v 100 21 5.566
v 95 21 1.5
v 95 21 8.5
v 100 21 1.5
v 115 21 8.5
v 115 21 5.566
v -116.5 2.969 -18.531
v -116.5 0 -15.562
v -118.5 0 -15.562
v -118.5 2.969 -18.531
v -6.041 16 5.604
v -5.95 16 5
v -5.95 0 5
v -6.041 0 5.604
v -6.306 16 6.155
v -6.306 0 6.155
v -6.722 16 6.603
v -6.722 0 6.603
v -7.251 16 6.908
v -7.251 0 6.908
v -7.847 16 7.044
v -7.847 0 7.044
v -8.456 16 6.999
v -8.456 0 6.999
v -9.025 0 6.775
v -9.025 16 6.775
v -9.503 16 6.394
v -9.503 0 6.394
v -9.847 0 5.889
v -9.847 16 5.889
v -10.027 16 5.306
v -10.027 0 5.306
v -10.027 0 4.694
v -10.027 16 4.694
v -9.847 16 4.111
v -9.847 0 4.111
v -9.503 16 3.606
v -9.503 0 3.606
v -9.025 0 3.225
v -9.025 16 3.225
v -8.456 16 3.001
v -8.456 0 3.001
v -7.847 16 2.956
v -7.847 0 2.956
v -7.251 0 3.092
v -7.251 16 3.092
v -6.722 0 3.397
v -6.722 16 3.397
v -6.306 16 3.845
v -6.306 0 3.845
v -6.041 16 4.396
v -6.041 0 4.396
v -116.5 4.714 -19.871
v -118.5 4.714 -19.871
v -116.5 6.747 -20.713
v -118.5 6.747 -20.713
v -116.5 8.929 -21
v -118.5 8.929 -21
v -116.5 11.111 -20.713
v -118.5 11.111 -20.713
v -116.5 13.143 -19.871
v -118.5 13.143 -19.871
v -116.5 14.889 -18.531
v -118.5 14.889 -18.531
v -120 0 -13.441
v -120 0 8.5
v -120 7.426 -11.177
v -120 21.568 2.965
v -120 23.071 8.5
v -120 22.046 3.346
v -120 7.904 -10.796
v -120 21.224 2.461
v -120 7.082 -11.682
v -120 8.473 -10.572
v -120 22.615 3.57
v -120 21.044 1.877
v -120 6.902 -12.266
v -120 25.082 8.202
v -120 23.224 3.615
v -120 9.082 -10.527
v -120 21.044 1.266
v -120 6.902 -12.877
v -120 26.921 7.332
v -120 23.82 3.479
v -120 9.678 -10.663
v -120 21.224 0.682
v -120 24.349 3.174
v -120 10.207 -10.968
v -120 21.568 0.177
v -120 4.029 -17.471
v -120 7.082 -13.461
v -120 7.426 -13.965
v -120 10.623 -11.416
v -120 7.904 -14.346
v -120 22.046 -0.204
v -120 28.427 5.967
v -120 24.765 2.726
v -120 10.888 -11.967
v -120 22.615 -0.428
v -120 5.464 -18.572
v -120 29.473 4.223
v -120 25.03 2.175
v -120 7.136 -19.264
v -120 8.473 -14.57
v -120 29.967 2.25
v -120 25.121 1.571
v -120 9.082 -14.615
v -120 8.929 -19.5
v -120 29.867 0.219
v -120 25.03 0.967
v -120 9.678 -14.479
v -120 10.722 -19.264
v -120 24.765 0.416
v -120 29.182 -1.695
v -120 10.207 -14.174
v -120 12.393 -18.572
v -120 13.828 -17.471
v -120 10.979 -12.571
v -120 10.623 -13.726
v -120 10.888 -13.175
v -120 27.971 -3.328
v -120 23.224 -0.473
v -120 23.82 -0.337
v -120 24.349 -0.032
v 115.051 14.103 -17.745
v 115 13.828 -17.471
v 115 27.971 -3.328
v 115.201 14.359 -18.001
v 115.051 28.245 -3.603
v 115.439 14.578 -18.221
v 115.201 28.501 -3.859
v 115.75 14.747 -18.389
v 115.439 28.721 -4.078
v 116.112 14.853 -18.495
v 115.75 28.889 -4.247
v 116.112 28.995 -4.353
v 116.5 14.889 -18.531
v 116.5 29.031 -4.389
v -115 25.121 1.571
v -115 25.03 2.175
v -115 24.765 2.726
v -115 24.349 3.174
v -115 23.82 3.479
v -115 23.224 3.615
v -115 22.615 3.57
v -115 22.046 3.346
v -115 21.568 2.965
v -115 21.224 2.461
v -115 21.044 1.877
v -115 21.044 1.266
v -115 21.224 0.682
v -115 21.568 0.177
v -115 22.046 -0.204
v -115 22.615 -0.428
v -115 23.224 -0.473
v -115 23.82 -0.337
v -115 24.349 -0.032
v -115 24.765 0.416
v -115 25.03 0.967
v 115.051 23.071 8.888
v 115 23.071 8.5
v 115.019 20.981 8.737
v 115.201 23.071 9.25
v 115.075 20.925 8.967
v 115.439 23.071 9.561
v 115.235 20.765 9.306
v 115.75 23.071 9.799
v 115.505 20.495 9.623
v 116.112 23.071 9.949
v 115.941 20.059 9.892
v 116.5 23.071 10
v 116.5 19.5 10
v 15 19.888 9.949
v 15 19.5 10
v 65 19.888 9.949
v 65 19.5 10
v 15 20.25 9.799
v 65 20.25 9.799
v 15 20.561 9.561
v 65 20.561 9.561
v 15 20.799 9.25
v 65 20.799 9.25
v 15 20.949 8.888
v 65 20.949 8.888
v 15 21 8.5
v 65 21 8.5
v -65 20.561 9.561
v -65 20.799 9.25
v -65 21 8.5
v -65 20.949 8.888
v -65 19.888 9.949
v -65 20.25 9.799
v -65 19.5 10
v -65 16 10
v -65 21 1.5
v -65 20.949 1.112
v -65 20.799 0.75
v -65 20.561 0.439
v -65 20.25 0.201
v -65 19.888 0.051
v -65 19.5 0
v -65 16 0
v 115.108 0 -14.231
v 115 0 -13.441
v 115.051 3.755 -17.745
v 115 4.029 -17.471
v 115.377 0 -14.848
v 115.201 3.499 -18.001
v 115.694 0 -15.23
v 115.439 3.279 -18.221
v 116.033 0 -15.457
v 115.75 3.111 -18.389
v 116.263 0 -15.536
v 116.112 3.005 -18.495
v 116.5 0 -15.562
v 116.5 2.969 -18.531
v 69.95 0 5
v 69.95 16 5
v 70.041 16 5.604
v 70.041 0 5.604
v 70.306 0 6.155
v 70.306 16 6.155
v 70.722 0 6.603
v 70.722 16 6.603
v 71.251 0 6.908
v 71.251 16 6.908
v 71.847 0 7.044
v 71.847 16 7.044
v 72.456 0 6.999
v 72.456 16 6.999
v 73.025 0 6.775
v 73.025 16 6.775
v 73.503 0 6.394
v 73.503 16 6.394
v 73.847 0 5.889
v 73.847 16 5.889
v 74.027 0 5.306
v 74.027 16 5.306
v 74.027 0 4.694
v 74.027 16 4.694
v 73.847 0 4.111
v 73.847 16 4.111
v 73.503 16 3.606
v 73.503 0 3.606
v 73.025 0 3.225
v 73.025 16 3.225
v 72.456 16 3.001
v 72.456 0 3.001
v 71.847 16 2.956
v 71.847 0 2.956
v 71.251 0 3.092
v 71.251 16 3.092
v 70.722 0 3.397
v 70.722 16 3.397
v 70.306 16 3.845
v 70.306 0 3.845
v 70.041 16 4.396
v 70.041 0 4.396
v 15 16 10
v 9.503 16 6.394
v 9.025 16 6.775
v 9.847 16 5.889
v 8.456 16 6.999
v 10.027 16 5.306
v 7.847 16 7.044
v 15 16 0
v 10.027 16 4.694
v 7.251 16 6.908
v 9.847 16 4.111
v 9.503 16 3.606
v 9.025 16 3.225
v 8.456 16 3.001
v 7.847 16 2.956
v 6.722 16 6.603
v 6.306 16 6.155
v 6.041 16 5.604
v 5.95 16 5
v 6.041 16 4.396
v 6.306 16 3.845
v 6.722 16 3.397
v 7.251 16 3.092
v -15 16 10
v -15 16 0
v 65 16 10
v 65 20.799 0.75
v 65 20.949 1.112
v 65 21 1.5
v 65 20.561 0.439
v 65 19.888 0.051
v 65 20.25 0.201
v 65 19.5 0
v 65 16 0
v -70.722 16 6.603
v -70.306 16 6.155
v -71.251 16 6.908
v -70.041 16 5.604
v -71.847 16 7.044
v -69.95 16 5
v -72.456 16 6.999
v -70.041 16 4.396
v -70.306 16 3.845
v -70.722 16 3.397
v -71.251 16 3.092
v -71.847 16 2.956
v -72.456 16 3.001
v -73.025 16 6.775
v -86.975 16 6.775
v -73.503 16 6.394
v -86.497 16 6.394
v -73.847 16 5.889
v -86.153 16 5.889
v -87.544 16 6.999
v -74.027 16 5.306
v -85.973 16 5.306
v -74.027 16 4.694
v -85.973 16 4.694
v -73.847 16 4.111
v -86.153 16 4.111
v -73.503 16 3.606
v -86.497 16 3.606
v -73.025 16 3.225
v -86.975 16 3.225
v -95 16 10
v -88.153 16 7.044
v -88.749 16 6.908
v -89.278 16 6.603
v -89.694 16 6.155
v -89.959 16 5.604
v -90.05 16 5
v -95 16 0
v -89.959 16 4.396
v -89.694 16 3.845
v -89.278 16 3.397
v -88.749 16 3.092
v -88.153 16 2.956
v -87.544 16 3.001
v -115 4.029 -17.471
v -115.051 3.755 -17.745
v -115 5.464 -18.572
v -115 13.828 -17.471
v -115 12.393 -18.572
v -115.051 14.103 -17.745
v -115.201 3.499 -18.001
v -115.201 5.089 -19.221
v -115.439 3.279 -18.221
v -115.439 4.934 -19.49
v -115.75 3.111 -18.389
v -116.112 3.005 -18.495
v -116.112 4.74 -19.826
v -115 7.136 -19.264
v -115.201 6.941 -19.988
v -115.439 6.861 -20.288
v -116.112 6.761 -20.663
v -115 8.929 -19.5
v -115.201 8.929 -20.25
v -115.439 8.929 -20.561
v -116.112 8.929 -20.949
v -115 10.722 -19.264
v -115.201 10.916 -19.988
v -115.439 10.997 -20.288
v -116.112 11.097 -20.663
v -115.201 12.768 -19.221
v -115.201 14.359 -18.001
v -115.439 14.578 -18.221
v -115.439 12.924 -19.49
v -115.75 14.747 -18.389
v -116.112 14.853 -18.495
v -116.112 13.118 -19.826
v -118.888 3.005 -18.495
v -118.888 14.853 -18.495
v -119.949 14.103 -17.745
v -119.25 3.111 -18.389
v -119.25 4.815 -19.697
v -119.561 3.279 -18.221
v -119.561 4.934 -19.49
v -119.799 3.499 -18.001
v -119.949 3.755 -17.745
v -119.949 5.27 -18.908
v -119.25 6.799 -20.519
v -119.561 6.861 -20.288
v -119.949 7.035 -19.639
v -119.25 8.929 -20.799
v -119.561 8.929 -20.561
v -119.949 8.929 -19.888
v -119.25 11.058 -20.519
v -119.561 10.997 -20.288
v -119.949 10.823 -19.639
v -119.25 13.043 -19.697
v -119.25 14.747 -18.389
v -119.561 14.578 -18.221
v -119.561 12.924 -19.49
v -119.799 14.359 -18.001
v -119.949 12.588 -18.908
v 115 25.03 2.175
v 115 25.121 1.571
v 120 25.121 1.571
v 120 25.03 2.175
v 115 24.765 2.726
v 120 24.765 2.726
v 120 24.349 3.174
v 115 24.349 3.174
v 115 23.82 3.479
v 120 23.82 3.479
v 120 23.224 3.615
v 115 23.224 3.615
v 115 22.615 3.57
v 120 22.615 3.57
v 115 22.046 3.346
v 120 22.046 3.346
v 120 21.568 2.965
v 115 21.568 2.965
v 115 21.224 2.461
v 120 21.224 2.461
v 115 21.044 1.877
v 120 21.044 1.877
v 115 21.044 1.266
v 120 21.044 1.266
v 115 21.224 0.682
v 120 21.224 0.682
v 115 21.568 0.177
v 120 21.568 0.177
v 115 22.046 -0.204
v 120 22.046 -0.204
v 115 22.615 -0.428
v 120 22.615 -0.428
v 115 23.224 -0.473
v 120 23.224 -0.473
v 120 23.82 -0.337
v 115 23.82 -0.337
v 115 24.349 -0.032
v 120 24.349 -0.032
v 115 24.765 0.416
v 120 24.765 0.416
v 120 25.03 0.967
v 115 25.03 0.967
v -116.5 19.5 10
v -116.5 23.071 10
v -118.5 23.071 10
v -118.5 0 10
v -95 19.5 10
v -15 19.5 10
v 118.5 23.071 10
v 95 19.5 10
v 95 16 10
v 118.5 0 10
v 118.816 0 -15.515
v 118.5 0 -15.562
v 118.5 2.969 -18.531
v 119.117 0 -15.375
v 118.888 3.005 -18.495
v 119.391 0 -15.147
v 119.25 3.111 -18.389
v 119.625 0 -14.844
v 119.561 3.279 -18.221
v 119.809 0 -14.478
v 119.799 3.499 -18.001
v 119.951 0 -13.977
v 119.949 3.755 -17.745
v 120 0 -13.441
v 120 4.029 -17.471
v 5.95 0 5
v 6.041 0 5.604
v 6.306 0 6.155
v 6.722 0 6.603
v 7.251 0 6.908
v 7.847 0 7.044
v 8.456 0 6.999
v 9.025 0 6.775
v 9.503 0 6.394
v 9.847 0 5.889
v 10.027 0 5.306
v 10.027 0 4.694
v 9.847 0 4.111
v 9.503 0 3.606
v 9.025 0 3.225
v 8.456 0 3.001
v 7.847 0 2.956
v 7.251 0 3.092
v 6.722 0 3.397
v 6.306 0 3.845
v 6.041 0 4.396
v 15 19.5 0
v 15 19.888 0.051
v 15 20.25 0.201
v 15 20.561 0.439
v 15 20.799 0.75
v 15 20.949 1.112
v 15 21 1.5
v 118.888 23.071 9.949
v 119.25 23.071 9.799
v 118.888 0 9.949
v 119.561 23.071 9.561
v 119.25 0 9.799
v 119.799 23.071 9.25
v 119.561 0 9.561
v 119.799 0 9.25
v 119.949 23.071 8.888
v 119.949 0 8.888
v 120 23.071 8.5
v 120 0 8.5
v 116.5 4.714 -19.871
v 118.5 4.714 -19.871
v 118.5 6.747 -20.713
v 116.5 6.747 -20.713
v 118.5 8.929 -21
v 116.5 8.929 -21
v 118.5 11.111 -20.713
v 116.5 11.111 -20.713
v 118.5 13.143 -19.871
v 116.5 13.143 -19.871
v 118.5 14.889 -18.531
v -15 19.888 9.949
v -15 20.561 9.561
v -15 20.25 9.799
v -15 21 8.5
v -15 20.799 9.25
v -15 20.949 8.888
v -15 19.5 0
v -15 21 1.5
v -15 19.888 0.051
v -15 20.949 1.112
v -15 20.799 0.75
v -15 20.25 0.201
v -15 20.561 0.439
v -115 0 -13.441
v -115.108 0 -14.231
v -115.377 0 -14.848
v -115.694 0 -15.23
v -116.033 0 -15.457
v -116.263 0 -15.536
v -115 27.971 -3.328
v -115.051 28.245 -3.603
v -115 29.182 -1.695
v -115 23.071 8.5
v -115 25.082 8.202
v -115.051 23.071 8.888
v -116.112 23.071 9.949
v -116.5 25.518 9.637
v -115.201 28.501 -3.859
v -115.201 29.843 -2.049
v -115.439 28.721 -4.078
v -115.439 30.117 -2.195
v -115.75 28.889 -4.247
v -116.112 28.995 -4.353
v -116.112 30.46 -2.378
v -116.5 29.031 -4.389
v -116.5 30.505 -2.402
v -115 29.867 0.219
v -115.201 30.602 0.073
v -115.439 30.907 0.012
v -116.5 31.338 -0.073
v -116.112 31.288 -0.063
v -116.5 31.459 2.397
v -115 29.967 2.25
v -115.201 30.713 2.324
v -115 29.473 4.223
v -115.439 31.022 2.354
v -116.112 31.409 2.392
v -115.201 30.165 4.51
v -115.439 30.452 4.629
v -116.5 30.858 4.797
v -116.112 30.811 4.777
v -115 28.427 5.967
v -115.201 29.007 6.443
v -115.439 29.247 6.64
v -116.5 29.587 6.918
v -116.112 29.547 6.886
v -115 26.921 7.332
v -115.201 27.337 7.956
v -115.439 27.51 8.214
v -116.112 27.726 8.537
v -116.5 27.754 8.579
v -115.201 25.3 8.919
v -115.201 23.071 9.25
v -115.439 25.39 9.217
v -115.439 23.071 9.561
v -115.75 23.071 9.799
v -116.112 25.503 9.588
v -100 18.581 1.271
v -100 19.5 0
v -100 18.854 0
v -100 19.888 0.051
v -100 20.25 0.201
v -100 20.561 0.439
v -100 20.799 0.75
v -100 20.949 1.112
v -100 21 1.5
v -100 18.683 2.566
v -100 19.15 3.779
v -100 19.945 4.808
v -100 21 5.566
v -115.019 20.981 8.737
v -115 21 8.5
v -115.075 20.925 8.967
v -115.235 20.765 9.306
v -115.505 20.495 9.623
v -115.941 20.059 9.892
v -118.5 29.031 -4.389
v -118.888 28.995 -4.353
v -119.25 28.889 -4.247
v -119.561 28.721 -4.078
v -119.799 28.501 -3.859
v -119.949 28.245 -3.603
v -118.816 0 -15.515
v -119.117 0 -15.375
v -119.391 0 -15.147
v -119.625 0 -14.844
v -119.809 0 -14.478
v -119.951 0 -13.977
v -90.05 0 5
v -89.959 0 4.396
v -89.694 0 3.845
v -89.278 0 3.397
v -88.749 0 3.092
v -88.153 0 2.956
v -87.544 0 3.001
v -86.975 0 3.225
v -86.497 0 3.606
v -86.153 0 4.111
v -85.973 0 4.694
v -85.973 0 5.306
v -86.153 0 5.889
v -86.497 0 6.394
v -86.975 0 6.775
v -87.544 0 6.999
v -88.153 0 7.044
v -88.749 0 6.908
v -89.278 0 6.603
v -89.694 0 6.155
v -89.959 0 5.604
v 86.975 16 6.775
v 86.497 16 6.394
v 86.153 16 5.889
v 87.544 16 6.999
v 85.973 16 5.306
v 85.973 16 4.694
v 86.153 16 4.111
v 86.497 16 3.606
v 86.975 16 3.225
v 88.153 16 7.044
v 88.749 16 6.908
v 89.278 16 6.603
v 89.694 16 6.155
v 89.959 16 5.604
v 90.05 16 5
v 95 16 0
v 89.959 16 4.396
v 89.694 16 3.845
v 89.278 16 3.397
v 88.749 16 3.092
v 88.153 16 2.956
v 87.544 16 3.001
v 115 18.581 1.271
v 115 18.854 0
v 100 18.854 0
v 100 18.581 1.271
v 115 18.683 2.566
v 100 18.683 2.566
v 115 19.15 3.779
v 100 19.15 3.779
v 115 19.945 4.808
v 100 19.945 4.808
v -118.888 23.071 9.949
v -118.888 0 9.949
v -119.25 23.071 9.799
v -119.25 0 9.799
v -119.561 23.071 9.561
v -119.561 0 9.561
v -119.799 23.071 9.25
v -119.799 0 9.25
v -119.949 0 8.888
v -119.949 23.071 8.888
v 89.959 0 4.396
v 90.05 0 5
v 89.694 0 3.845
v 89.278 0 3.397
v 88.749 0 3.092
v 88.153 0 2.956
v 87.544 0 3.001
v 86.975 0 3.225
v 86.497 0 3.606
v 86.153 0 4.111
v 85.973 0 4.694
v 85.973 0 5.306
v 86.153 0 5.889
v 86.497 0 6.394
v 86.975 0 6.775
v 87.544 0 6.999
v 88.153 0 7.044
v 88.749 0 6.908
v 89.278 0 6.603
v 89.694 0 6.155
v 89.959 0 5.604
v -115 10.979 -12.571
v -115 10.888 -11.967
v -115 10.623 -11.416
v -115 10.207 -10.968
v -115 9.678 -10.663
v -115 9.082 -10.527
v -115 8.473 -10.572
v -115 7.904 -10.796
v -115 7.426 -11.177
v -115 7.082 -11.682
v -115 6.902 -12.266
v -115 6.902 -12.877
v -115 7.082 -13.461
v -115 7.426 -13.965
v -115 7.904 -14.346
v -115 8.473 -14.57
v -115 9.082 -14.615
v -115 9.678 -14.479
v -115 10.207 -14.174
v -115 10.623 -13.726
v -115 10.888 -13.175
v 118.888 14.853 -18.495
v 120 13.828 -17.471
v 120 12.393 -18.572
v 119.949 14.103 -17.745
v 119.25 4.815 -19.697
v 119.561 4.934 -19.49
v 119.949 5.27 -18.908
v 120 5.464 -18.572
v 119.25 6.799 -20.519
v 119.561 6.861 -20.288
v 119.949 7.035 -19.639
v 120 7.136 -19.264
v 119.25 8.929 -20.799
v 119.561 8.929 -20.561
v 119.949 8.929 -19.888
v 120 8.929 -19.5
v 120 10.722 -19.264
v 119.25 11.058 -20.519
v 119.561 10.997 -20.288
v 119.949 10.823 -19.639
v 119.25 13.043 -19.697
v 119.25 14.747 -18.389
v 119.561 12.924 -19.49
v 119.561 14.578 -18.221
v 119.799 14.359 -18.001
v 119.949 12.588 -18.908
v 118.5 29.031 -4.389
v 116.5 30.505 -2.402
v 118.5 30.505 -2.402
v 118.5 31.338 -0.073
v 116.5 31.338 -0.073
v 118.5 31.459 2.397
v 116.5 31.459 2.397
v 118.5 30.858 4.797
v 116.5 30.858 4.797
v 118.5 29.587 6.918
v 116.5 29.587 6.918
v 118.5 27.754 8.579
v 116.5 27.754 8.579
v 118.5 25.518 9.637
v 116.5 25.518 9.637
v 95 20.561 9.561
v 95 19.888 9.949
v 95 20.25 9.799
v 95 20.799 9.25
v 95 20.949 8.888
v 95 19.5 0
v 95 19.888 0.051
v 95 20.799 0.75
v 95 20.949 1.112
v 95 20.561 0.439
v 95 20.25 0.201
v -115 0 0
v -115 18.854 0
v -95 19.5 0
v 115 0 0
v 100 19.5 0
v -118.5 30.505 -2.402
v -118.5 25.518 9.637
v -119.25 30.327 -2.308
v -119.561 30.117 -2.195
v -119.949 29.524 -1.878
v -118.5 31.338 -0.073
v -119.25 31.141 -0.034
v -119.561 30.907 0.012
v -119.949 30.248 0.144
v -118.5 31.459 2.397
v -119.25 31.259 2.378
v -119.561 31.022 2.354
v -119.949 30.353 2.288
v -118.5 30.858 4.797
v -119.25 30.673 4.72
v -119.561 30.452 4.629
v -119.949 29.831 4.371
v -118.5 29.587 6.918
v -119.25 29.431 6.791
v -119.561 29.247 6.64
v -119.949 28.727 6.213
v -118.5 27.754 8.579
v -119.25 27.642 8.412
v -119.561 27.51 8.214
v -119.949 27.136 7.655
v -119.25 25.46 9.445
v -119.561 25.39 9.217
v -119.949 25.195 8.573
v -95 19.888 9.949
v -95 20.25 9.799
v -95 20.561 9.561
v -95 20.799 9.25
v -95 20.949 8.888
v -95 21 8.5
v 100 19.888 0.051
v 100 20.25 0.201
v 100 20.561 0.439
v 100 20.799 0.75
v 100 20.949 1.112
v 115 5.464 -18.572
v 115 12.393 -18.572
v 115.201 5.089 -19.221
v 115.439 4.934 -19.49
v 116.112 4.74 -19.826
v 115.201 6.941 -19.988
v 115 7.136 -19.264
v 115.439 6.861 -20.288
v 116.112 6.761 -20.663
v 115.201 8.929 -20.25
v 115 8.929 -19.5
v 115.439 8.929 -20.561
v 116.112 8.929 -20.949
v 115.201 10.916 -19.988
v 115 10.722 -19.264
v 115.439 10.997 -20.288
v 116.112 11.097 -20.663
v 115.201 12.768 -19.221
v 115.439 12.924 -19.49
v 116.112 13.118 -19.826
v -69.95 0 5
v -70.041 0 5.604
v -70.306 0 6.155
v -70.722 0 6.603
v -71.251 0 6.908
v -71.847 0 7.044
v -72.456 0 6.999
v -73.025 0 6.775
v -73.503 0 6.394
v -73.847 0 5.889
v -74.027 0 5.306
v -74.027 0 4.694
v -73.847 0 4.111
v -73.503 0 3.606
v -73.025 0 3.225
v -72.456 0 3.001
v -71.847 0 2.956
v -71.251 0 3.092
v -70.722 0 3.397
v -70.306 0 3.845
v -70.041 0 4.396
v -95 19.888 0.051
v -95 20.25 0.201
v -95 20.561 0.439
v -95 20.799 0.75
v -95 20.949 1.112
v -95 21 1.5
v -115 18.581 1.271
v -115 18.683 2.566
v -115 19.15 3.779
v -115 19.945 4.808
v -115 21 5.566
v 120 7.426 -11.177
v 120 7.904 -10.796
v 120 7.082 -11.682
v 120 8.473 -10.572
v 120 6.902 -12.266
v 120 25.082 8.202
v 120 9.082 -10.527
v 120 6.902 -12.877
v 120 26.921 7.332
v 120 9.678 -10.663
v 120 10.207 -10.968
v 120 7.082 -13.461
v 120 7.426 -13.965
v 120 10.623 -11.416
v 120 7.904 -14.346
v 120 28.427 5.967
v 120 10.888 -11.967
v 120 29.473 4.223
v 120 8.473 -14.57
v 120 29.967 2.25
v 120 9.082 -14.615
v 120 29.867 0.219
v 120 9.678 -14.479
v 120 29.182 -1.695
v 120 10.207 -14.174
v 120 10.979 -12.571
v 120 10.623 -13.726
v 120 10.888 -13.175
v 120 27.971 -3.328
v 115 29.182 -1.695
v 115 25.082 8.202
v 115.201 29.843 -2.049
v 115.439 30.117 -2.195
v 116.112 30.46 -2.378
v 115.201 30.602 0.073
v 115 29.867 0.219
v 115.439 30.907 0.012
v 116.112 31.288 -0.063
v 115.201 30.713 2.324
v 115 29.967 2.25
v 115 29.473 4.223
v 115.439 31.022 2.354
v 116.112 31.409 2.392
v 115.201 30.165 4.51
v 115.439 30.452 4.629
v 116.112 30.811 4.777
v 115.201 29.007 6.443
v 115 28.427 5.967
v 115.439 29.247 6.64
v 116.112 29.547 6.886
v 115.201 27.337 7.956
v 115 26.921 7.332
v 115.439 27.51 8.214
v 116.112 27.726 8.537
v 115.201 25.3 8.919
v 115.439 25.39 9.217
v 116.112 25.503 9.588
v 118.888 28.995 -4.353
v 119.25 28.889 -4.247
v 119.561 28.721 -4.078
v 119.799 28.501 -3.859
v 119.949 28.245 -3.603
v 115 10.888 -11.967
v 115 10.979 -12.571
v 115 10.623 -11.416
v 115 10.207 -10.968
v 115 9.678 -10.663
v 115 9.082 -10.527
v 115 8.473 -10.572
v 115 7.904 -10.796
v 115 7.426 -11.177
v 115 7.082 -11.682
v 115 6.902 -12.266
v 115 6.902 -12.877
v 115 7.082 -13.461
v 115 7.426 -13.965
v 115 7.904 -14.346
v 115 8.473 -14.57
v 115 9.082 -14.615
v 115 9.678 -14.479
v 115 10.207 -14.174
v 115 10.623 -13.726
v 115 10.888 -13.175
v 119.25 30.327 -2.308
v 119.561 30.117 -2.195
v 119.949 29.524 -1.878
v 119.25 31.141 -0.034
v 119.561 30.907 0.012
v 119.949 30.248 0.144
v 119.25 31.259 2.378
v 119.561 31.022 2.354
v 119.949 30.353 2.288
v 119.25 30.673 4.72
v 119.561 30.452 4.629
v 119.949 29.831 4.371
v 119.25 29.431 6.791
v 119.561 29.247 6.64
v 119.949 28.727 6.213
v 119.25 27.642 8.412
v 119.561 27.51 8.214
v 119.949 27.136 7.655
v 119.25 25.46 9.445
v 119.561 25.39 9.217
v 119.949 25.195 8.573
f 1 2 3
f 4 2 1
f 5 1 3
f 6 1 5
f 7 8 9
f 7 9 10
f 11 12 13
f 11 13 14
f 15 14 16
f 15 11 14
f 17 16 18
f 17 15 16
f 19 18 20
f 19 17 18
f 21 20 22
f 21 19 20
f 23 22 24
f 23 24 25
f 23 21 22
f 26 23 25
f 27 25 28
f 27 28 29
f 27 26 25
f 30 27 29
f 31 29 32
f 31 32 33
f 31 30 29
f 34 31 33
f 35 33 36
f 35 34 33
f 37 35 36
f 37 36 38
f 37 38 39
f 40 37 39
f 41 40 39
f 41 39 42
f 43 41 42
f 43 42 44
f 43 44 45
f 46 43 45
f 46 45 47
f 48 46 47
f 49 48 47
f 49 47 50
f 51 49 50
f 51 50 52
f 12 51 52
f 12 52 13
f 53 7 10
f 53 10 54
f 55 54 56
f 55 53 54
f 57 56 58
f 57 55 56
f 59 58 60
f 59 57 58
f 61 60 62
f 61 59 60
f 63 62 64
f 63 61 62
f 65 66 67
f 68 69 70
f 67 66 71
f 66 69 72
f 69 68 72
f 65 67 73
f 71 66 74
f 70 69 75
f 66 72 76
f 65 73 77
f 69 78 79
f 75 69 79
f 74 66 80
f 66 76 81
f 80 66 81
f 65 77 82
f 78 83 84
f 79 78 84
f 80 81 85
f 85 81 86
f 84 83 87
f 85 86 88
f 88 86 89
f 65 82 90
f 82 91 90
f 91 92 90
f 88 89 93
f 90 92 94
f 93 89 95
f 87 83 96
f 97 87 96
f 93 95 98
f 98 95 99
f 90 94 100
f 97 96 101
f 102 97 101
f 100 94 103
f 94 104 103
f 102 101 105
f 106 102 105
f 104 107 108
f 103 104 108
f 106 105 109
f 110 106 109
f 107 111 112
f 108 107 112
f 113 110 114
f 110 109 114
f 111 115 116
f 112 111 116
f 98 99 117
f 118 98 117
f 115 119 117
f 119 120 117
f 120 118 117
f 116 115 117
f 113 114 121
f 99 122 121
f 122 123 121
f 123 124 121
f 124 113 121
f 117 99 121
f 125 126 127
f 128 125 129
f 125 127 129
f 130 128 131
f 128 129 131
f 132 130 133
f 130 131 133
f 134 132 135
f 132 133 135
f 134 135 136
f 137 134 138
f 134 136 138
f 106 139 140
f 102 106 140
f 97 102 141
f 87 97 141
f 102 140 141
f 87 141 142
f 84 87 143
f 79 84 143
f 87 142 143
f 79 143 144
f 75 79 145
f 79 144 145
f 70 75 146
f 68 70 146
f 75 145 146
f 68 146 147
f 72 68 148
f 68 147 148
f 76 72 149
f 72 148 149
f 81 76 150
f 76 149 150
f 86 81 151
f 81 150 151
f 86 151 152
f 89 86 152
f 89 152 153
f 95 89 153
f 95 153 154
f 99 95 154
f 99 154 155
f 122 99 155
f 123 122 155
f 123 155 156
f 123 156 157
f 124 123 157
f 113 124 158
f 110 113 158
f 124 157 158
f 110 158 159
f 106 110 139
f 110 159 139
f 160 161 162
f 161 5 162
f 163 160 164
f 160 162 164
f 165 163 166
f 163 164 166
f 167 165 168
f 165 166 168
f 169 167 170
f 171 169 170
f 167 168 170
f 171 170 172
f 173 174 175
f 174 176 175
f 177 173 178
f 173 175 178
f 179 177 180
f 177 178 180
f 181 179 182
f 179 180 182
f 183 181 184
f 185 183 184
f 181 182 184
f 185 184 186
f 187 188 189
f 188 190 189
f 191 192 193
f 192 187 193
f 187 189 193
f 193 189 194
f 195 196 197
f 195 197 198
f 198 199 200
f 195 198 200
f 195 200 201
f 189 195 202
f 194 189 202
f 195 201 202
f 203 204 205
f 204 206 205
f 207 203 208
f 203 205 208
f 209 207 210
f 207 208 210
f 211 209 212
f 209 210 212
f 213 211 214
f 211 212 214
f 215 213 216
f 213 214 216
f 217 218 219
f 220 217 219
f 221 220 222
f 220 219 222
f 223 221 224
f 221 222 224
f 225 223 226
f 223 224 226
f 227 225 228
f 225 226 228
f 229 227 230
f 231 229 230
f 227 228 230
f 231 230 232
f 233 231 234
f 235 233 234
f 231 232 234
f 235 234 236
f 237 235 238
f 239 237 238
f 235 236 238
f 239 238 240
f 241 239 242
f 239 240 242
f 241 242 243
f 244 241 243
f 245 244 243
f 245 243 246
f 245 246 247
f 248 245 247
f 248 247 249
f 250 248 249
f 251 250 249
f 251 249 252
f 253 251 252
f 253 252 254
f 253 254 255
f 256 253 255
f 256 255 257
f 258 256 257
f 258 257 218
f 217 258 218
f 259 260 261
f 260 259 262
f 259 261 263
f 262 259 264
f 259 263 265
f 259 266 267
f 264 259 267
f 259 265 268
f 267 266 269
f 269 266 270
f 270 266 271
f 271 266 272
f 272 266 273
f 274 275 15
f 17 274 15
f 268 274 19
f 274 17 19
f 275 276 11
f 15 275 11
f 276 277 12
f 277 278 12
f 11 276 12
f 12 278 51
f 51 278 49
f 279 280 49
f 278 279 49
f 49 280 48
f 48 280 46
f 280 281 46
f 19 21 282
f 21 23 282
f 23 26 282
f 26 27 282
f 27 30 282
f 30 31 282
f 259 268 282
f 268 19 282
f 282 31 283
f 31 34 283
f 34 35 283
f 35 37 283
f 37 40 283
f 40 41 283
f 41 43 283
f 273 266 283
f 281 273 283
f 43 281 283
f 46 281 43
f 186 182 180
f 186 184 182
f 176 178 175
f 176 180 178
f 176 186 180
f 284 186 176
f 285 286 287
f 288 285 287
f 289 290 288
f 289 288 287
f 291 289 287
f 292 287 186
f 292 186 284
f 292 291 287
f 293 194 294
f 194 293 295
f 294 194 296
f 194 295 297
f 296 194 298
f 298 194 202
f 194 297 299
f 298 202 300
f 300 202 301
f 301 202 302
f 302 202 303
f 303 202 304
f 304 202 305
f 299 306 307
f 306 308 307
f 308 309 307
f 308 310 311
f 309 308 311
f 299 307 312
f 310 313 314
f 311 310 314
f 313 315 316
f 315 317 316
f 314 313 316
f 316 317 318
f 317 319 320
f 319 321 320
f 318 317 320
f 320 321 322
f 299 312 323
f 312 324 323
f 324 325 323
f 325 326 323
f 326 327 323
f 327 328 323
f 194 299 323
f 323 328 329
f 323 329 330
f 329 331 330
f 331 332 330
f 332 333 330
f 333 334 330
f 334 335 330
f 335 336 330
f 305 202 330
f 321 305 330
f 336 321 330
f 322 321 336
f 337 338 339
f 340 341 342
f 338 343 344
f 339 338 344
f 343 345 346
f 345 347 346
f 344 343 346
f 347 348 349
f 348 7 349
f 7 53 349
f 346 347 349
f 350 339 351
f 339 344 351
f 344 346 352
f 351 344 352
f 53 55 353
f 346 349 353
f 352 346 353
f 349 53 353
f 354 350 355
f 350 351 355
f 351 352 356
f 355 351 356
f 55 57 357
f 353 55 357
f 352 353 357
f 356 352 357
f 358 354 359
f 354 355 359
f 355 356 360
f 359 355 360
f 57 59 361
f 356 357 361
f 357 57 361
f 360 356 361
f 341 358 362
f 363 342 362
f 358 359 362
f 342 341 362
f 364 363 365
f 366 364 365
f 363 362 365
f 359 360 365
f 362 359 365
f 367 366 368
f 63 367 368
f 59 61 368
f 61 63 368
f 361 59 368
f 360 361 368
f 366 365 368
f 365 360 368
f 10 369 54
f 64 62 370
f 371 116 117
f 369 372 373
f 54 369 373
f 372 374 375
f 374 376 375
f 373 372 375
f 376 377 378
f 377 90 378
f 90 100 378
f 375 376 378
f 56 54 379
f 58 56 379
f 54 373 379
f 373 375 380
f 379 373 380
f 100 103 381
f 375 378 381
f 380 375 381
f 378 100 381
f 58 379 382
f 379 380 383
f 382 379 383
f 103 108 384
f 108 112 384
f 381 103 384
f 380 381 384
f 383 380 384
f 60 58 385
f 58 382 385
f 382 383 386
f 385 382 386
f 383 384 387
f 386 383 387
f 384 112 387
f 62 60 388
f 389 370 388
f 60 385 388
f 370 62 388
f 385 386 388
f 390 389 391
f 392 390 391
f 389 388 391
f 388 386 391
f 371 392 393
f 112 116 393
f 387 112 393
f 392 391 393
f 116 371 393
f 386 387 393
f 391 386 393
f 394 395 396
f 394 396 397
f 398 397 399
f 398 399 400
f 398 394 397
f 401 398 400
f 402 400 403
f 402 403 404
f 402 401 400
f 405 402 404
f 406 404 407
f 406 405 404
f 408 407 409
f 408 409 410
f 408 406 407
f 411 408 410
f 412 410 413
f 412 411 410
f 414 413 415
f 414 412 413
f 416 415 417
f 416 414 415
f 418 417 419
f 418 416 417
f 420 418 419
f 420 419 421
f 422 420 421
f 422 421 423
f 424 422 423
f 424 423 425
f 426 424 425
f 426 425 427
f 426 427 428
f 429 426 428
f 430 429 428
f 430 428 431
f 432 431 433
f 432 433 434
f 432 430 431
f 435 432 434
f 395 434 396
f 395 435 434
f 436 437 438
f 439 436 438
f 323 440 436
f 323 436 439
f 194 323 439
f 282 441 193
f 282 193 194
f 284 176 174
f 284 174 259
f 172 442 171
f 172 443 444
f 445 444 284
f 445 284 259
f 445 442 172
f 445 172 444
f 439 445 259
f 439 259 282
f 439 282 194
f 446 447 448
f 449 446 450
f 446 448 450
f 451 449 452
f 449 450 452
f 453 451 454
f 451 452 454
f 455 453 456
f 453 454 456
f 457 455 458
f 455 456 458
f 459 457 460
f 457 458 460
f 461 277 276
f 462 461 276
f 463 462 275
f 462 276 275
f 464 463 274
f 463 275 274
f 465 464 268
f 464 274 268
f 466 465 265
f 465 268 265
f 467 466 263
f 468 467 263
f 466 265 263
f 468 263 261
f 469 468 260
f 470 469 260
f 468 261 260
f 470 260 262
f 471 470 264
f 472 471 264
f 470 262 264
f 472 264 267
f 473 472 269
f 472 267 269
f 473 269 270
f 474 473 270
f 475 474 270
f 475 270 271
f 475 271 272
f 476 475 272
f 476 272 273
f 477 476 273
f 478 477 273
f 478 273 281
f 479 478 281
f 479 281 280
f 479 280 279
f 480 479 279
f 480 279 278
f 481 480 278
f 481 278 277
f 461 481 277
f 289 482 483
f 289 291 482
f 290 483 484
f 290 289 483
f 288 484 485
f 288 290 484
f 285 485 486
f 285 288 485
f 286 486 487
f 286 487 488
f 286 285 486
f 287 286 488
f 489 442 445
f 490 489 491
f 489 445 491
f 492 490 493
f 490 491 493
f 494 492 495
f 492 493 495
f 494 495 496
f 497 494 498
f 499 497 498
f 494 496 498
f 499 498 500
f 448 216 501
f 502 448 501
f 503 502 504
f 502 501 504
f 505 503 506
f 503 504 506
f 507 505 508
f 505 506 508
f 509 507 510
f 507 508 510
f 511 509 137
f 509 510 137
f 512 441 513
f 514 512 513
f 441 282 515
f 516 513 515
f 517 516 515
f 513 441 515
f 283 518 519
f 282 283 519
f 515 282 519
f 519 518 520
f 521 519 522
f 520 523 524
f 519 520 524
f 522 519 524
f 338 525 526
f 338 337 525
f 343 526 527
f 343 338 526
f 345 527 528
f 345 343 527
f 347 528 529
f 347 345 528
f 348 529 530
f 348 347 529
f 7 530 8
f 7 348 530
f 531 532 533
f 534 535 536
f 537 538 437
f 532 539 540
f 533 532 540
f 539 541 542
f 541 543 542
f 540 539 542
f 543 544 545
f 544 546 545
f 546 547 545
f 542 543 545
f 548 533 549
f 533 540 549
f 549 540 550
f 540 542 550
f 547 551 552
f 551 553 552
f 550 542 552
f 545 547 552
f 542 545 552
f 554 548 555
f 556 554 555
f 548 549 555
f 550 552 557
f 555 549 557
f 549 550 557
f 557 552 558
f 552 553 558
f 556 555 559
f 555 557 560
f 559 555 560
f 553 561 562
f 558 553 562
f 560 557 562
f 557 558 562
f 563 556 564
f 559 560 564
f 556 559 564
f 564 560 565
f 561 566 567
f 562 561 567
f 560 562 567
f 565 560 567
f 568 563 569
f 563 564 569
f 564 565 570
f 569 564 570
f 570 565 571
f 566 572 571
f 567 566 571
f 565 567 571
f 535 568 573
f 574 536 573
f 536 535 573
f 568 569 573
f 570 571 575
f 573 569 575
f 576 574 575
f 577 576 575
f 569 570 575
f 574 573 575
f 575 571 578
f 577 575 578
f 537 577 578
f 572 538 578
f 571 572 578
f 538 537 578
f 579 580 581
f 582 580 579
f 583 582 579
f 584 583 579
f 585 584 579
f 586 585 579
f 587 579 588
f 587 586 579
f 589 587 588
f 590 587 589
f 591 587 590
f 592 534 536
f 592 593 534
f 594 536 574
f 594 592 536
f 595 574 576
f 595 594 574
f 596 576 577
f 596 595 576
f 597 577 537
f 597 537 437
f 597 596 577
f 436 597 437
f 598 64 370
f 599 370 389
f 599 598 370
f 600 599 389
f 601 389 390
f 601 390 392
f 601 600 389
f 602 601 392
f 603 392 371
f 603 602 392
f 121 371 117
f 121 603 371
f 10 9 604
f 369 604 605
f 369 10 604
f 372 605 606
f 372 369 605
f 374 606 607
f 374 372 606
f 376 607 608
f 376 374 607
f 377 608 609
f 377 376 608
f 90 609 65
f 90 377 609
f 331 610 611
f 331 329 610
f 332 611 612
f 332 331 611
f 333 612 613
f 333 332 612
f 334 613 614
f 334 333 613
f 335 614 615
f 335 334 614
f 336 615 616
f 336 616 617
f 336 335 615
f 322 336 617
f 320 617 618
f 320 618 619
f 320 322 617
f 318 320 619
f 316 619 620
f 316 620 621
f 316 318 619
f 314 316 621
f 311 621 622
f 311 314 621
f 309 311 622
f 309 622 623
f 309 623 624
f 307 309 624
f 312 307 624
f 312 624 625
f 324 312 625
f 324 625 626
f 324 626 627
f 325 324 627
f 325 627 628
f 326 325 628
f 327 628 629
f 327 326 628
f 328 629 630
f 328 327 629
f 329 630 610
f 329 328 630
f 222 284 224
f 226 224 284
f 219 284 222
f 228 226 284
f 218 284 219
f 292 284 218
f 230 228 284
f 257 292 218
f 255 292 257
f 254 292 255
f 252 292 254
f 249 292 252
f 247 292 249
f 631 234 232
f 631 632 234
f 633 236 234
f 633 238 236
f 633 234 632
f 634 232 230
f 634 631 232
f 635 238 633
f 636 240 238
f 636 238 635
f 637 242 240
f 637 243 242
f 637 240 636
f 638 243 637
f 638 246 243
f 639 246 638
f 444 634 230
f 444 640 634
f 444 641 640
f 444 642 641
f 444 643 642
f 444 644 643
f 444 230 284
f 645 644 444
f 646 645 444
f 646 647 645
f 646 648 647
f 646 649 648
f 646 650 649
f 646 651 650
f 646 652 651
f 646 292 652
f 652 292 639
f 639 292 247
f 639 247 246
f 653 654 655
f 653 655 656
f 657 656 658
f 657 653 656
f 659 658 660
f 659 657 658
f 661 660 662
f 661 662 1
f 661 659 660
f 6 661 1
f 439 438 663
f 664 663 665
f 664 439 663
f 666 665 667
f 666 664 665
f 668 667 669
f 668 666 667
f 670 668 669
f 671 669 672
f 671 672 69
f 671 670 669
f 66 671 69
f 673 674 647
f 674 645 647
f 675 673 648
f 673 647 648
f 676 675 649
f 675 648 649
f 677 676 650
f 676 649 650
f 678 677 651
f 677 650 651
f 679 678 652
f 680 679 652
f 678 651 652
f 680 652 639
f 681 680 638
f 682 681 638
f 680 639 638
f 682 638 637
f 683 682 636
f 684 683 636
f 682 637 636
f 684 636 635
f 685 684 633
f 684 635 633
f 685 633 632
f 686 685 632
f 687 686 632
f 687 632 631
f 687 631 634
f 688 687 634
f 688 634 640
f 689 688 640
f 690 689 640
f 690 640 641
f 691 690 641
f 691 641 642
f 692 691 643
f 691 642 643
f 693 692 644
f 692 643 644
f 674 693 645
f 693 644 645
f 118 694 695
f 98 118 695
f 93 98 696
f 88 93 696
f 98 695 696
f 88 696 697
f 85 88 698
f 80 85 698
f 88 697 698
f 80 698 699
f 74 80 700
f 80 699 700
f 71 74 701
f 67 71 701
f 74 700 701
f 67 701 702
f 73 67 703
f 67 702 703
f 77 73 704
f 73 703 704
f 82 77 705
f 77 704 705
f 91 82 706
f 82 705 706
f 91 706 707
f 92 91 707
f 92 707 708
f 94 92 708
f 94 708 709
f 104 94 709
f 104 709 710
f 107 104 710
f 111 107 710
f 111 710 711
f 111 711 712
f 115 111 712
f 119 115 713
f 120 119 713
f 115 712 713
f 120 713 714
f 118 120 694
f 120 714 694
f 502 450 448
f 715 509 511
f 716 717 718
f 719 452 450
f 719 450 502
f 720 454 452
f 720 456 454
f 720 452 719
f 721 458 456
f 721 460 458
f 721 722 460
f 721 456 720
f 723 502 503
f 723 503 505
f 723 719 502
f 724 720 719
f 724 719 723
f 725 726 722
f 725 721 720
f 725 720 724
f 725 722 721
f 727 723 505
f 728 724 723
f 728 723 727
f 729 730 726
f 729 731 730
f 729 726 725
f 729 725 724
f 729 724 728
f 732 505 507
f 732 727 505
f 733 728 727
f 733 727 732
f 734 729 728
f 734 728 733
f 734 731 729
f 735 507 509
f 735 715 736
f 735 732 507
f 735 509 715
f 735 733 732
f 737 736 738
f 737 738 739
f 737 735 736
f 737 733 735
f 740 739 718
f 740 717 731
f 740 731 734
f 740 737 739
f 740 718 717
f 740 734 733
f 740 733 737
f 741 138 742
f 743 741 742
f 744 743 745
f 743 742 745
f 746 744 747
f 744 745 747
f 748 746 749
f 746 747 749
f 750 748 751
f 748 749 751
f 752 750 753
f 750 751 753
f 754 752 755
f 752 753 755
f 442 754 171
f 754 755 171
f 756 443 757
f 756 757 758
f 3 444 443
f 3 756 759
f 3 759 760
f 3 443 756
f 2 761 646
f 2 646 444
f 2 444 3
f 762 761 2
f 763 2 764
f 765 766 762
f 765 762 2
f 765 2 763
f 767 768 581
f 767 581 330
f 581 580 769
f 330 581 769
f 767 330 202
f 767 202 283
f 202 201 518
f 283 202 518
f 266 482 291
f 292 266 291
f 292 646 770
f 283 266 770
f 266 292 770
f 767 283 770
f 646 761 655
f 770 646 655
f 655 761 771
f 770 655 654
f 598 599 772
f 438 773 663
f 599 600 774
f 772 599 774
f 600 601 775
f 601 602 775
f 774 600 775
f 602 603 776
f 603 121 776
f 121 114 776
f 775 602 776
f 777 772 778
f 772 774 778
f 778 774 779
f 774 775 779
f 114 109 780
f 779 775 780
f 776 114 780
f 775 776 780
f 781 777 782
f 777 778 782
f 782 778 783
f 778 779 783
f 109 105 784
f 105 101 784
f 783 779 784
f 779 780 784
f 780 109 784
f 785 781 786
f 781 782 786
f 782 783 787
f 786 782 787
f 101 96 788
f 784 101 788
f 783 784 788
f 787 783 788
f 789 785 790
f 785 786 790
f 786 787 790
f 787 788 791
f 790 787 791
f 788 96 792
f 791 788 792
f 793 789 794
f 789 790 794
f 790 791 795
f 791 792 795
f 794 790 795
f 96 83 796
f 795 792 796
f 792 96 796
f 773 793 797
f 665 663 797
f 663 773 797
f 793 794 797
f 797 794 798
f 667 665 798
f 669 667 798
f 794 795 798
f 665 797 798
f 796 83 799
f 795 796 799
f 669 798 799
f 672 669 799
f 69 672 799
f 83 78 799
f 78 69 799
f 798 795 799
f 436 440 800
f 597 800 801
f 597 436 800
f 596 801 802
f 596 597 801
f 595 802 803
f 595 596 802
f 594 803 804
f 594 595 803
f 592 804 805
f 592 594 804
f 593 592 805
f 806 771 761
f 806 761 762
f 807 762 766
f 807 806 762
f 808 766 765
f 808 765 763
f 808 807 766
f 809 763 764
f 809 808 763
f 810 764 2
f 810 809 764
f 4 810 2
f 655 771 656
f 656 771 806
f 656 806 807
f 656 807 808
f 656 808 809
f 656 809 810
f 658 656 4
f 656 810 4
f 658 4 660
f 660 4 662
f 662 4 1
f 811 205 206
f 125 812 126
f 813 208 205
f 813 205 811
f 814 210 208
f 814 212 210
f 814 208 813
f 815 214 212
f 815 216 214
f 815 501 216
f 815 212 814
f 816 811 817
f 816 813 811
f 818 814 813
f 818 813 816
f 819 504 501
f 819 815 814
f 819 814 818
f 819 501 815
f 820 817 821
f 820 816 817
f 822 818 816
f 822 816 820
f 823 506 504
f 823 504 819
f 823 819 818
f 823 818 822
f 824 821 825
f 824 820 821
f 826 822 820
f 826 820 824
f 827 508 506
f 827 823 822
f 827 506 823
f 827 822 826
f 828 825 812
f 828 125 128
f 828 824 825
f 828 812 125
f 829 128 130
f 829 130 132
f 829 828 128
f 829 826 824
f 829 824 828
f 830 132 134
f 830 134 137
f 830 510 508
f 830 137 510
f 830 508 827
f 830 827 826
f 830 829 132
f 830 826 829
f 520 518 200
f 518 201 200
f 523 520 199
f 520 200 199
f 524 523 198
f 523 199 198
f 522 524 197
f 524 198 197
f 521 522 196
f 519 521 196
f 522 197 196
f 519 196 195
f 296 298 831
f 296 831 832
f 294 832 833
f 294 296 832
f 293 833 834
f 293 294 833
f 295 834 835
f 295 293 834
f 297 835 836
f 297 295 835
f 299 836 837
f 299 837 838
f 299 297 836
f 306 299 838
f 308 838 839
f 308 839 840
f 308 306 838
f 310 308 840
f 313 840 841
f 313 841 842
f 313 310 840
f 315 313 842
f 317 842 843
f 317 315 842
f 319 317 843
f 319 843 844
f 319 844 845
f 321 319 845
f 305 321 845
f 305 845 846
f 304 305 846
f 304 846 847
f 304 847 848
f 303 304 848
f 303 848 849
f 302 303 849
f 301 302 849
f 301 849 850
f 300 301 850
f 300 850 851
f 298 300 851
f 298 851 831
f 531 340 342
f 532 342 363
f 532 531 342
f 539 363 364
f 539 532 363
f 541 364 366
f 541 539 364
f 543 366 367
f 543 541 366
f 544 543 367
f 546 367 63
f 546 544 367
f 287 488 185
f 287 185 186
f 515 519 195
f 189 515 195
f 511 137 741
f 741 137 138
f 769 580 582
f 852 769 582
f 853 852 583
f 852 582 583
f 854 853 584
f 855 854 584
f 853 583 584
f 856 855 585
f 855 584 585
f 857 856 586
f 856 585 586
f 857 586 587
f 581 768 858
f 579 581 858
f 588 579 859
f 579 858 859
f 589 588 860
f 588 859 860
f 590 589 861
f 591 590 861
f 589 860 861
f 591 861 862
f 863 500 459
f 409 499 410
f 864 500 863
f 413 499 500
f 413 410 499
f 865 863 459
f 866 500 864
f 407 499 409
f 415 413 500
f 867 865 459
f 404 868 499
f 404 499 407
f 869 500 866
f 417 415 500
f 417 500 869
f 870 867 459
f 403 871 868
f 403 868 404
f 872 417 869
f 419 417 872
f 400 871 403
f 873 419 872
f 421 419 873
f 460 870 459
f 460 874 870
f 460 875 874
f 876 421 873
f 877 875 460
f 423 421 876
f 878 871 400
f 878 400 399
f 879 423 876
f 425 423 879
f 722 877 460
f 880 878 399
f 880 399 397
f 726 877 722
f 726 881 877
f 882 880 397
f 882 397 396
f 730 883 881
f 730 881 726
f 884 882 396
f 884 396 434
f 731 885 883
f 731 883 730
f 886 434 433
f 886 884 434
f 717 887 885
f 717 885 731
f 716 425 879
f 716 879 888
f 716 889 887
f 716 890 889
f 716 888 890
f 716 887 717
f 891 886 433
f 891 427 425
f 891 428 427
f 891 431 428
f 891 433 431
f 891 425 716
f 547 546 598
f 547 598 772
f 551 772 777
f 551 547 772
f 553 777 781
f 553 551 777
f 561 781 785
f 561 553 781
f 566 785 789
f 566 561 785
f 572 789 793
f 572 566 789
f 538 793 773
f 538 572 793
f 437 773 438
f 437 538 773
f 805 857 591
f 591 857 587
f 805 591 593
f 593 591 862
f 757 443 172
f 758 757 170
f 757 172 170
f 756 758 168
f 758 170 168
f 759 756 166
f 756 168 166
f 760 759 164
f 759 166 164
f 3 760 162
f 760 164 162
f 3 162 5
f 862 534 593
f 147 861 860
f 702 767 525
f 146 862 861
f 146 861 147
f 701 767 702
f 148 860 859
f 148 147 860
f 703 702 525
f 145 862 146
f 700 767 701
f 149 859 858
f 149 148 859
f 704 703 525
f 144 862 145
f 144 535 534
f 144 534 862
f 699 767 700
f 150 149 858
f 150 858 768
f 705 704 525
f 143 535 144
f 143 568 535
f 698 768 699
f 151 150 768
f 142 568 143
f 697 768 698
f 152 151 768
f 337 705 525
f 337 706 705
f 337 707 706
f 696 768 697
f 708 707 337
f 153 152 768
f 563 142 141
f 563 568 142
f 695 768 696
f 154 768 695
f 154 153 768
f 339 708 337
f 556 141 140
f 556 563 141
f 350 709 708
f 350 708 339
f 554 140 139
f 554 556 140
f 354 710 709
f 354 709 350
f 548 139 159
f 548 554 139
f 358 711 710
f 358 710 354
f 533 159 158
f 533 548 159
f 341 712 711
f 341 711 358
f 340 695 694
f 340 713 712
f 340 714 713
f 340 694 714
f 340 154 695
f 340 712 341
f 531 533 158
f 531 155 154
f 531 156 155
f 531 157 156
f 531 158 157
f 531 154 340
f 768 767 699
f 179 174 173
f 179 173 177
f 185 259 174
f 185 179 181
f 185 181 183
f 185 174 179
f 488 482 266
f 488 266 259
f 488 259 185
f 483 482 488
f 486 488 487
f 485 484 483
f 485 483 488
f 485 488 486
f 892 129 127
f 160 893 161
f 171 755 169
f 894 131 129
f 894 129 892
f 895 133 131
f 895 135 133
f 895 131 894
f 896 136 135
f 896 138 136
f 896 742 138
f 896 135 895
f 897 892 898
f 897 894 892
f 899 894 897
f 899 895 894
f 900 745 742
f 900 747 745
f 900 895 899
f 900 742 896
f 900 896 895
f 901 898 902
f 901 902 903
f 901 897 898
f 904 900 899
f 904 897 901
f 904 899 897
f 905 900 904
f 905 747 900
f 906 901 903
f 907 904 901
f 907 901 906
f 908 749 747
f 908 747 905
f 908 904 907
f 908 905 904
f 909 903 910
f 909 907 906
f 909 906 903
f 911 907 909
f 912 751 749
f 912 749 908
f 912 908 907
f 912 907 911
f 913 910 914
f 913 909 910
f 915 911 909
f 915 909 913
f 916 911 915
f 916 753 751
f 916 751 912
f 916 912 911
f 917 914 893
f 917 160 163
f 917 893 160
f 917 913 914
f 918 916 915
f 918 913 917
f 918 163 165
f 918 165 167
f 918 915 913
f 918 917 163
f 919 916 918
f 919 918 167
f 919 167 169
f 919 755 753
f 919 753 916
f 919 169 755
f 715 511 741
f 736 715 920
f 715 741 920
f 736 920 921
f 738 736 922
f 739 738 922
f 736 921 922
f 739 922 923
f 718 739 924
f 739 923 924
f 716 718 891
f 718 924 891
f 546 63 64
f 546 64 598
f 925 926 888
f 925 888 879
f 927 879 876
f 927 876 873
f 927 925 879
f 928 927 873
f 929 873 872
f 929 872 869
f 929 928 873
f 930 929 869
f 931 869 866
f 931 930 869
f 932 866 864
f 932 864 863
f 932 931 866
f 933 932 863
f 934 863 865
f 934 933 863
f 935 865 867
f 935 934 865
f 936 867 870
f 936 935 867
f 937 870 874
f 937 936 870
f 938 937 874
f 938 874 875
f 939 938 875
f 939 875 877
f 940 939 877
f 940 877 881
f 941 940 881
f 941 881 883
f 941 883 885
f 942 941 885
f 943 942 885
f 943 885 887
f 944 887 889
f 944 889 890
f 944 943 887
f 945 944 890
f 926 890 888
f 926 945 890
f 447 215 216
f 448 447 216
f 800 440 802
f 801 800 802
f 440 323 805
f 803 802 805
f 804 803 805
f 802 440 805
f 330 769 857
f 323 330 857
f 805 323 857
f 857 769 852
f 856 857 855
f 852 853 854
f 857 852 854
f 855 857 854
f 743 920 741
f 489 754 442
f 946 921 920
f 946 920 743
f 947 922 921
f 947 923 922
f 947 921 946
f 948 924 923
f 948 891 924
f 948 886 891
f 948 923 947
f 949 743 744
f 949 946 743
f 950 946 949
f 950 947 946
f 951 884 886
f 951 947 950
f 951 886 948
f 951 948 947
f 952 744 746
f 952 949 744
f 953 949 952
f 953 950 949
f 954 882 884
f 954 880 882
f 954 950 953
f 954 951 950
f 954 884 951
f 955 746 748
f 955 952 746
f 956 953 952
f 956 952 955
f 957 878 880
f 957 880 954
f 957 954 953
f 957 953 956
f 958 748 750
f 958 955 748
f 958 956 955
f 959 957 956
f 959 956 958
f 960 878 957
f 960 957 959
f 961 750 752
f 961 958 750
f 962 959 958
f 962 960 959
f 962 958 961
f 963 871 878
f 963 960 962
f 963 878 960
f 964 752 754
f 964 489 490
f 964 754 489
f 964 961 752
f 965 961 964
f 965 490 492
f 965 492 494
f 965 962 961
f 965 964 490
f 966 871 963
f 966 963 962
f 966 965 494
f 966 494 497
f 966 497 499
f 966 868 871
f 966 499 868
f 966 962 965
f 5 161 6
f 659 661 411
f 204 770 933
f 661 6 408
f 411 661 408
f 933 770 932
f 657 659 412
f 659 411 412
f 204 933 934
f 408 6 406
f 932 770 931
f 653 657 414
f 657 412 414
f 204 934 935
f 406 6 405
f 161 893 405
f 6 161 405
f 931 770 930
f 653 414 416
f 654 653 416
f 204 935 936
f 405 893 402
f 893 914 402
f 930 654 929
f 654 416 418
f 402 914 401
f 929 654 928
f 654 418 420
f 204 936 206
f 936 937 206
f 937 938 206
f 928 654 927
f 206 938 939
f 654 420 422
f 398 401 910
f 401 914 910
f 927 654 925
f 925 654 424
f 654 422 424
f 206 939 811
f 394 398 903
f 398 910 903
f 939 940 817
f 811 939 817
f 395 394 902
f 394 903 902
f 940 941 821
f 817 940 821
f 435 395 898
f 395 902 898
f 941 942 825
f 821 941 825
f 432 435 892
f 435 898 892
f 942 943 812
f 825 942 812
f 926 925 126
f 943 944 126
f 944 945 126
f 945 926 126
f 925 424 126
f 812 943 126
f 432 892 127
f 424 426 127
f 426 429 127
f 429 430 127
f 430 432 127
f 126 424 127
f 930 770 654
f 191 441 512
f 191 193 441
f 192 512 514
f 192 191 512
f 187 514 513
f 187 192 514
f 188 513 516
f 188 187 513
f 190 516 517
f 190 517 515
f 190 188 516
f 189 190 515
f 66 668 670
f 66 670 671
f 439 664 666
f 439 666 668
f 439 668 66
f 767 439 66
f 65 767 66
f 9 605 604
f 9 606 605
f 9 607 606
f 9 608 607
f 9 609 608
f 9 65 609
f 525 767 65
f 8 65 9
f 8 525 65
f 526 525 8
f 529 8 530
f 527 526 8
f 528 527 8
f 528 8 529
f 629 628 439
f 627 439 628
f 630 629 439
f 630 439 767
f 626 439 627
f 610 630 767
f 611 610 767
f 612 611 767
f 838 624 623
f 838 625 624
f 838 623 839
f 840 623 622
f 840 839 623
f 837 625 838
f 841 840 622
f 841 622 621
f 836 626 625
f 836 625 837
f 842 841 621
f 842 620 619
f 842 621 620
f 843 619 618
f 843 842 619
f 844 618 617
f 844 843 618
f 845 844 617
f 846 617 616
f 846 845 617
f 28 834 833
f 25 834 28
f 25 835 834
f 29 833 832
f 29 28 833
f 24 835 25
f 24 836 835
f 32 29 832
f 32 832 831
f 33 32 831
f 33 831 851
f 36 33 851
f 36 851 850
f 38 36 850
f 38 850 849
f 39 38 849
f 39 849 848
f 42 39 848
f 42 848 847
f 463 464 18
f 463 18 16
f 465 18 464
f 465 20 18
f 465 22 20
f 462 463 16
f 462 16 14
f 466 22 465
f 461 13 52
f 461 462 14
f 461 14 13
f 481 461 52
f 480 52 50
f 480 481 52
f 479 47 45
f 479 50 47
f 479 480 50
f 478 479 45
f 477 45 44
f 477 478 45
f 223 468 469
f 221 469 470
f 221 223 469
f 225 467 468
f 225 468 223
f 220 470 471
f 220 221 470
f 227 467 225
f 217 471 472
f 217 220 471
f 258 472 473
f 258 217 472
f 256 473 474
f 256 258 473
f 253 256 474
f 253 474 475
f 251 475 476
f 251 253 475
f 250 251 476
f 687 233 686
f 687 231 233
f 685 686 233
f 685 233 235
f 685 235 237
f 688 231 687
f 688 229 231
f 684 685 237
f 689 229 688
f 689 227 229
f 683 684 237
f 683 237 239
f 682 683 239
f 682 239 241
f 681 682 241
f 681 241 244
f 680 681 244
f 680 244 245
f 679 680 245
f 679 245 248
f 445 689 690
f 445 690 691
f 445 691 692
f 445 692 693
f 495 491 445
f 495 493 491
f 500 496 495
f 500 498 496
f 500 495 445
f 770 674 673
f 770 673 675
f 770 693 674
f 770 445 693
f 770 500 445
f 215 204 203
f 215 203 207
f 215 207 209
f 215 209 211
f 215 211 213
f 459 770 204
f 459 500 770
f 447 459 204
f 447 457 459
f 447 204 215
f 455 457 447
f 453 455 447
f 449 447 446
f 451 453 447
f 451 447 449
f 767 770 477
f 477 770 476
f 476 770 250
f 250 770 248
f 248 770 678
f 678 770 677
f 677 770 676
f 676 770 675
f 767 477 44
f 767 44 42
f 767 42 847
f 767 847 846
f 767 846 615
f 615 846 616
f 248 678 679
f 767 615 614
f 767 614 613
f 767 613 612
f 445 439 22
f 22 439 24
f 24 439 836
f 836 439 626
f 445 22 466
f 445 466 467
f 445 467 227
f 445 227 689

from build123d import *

# Parameters (mm, degrees)
BOSS_EXTRU_1_DEPTH      = 10
ESQUISSE6_R             = 2.05
ESQUISSE6_W             = 10
ESQUISSE6_H             = 21
BOSS_EXTRU_3_DEPTH      = 5
ESQUISSE4_R             = 2.05
ENL_V_MAT_EXTRU_2_DEPTH = 123.869849841
CONG_1_R                = 1.5
ESQUISSE8_R             = 2.05
ENL_V_MAT_EXTRU_4_DEPTH = 15


# Read off the part's stored shape, not the designer's step: Symétrie9
with BuildPart() as part:
    # Esquisse2 → Boss.-Extru.1 (new body)
    with BuildSketch(Plane.XY):
        Polygon((0, 0), (0, 16), (15, 16), (15, 21), (65, 21), (65, 16), (95, 16), (95, 21), (115, 21), (115, 0), align=None)
    extrude(amount=BOSS_EXTRU_1_DEPTH)

    # Esquisse6 → Boss.-Extru.3 (add)
    # profile 1 of 2: a face of its own
    with BuildSketch(Plane(origin=(115, 0, 0), x_dir=(0, 0, -1), z_dir=(1, 0, 0))):
        with BuildLine():
            Line((15.562445841, 0), (18.53122292, 2.96877708))
            ThreePointArc((18.53122292, 2.96877708), (21, 8.928932188), (18.53122292, 14.889087297))
            Line((18.53122292, 14.889087297), (4.389087297, 29.03122292))
            ThreePointArc((4.389087297, 29.03122292), (-4.796680513, 30.858385741), (-10, 23.071067812))
            Line((-10, 23.071067812), (-10, 21))
            Line((-10, 21), (0, 21))
            Line((0, 21), (0, 0))
            Line((0, 0), (15.562445841, 0))
        make_face()
        with Locations(Location((12.571067812, 8.928932188, 0), (0, 0, 90))):
            Circle(ESQUISSE6_R, mode=Mode.SUBTRACT)
        with Locations(Location((-1.571067812, 23.071067812, 0), (0, 0, 90))):
            Circle(ESQUISSE6_R, mode=Mode.SUBTRACT)
    # profile 2 of 2: a face of its own
    with BuildSketch(Plane(origin=(115, 0, 0), x_dir=(0, 0, -1), z_dir=(1, 0, 0))):
        with Locations((-5, 10.5)):
            Rectangle(ESQUISSE6_W, ESQUISSE6_H)
    extrude(amount=BOSS_EXTRU_3_DEPTH)

    # Esquisse4 → Enlèv. mat.-Extru.2 (cut, symmetric)
    with BuildSketch(Plane(origin=(0, 16, 0), x_dir=(1, 0, 0), z_dir=(0, 1, 0))):
        with Locations(Location((8, -5, 0), (0, 0, 180))):
            Circle(ESQUISSE4_R)
        with Locations(Location((72, -5, 0), (0, 0, 180))):
            Circle(ESQUISSE4_R)
        with Locations((88, -5)):
            Circle(ESQUISSE4_R)
    extrude(amount=ENL_V_MAT_EXTRU_2_DEPTH, both=True, mode=Mode.SUBTRACT)

    # Congé1
    cong_1_edges = [part.edges().sort_by_distance(p)[0] for p in [
        (40, 21, 0),
        (105, 21, 10),
        (105, 21, 0),
        (40, 21, 10),
        (115, 21.960155108, -11.460155108),
        (115, 8.928932188, -21),
        (115, 1.48438854, -17.04683438),
        (115, 22.035533906, 10),
        (120, 1.48438854, -17.04683438),
        (120, 8.928932188, -21),
        (120, 21.960155108, -11.460155108),
        (115, 30.858385741, 4.796680513),
        (120, 11.535533906, 10),
        (120, 30.858385741, 4.796680513),
    ]]
    fillet(cong_1_edges, radius=CONG_1_R)

    # Esquisse8 → Enlèv. mat.-Extru.4 (cut)
    # profile 1 of 2: a face of its own
    with BuildSketch(Plane.ZY.offset(-115)):
        with BuildLine():
            ThreePointArc((0, 19.5), (0.439339828, 20.560660172), (1.5, 21))
            Line((1.5, 21), (5.566149553, 21))
            ThreePointArc((5.566149553, 21), (5.943016338, 22.005203804), (6.071067812, 23.071067812))
            ThreePointArc((6.071067812, 23.071067812), (-0.996050694, 26.766998355), (0, 18.85422706))
            Line((0, 18.85422706), (0, 19.5))
        make_face()
        with Locations(Location((1.571067812, 23.071067812, 0), (0, 0, 90))):
            Circle(ESQUISSE8_R, mode=Mode.SUBTRACT)
    # profile 2 of 2: a face of its own
    with BuildSketch(Plane.ZY.offset(-115)):
        with BuildLine():
            Line((5.566149553, 21), (1.5, 21))
            ThreePointArc((1.5, 21), (0.439339828, 20.560660172), (0, 19.5))
            Line((0, 19.5), (0, 18.85422706))
            ThreePointArc((0, 18.85422706), (3.189723507, 18.872263966), (5.566149553, 21))
        make_face()
    extrude(amount=ENL_V_MAT_EXTRU_4_DEPTH, mode=Mode.SUBTRACT)

    # Symétrie9: part across plane


with BuildPart() as part_1:
    add(part.part)
    add(part.part.mirror(Plane(origin=(0, 0, 10), x_dir=(0, 0, 1), z_dir=(1, 0, 0))))


solid = part_1.part
